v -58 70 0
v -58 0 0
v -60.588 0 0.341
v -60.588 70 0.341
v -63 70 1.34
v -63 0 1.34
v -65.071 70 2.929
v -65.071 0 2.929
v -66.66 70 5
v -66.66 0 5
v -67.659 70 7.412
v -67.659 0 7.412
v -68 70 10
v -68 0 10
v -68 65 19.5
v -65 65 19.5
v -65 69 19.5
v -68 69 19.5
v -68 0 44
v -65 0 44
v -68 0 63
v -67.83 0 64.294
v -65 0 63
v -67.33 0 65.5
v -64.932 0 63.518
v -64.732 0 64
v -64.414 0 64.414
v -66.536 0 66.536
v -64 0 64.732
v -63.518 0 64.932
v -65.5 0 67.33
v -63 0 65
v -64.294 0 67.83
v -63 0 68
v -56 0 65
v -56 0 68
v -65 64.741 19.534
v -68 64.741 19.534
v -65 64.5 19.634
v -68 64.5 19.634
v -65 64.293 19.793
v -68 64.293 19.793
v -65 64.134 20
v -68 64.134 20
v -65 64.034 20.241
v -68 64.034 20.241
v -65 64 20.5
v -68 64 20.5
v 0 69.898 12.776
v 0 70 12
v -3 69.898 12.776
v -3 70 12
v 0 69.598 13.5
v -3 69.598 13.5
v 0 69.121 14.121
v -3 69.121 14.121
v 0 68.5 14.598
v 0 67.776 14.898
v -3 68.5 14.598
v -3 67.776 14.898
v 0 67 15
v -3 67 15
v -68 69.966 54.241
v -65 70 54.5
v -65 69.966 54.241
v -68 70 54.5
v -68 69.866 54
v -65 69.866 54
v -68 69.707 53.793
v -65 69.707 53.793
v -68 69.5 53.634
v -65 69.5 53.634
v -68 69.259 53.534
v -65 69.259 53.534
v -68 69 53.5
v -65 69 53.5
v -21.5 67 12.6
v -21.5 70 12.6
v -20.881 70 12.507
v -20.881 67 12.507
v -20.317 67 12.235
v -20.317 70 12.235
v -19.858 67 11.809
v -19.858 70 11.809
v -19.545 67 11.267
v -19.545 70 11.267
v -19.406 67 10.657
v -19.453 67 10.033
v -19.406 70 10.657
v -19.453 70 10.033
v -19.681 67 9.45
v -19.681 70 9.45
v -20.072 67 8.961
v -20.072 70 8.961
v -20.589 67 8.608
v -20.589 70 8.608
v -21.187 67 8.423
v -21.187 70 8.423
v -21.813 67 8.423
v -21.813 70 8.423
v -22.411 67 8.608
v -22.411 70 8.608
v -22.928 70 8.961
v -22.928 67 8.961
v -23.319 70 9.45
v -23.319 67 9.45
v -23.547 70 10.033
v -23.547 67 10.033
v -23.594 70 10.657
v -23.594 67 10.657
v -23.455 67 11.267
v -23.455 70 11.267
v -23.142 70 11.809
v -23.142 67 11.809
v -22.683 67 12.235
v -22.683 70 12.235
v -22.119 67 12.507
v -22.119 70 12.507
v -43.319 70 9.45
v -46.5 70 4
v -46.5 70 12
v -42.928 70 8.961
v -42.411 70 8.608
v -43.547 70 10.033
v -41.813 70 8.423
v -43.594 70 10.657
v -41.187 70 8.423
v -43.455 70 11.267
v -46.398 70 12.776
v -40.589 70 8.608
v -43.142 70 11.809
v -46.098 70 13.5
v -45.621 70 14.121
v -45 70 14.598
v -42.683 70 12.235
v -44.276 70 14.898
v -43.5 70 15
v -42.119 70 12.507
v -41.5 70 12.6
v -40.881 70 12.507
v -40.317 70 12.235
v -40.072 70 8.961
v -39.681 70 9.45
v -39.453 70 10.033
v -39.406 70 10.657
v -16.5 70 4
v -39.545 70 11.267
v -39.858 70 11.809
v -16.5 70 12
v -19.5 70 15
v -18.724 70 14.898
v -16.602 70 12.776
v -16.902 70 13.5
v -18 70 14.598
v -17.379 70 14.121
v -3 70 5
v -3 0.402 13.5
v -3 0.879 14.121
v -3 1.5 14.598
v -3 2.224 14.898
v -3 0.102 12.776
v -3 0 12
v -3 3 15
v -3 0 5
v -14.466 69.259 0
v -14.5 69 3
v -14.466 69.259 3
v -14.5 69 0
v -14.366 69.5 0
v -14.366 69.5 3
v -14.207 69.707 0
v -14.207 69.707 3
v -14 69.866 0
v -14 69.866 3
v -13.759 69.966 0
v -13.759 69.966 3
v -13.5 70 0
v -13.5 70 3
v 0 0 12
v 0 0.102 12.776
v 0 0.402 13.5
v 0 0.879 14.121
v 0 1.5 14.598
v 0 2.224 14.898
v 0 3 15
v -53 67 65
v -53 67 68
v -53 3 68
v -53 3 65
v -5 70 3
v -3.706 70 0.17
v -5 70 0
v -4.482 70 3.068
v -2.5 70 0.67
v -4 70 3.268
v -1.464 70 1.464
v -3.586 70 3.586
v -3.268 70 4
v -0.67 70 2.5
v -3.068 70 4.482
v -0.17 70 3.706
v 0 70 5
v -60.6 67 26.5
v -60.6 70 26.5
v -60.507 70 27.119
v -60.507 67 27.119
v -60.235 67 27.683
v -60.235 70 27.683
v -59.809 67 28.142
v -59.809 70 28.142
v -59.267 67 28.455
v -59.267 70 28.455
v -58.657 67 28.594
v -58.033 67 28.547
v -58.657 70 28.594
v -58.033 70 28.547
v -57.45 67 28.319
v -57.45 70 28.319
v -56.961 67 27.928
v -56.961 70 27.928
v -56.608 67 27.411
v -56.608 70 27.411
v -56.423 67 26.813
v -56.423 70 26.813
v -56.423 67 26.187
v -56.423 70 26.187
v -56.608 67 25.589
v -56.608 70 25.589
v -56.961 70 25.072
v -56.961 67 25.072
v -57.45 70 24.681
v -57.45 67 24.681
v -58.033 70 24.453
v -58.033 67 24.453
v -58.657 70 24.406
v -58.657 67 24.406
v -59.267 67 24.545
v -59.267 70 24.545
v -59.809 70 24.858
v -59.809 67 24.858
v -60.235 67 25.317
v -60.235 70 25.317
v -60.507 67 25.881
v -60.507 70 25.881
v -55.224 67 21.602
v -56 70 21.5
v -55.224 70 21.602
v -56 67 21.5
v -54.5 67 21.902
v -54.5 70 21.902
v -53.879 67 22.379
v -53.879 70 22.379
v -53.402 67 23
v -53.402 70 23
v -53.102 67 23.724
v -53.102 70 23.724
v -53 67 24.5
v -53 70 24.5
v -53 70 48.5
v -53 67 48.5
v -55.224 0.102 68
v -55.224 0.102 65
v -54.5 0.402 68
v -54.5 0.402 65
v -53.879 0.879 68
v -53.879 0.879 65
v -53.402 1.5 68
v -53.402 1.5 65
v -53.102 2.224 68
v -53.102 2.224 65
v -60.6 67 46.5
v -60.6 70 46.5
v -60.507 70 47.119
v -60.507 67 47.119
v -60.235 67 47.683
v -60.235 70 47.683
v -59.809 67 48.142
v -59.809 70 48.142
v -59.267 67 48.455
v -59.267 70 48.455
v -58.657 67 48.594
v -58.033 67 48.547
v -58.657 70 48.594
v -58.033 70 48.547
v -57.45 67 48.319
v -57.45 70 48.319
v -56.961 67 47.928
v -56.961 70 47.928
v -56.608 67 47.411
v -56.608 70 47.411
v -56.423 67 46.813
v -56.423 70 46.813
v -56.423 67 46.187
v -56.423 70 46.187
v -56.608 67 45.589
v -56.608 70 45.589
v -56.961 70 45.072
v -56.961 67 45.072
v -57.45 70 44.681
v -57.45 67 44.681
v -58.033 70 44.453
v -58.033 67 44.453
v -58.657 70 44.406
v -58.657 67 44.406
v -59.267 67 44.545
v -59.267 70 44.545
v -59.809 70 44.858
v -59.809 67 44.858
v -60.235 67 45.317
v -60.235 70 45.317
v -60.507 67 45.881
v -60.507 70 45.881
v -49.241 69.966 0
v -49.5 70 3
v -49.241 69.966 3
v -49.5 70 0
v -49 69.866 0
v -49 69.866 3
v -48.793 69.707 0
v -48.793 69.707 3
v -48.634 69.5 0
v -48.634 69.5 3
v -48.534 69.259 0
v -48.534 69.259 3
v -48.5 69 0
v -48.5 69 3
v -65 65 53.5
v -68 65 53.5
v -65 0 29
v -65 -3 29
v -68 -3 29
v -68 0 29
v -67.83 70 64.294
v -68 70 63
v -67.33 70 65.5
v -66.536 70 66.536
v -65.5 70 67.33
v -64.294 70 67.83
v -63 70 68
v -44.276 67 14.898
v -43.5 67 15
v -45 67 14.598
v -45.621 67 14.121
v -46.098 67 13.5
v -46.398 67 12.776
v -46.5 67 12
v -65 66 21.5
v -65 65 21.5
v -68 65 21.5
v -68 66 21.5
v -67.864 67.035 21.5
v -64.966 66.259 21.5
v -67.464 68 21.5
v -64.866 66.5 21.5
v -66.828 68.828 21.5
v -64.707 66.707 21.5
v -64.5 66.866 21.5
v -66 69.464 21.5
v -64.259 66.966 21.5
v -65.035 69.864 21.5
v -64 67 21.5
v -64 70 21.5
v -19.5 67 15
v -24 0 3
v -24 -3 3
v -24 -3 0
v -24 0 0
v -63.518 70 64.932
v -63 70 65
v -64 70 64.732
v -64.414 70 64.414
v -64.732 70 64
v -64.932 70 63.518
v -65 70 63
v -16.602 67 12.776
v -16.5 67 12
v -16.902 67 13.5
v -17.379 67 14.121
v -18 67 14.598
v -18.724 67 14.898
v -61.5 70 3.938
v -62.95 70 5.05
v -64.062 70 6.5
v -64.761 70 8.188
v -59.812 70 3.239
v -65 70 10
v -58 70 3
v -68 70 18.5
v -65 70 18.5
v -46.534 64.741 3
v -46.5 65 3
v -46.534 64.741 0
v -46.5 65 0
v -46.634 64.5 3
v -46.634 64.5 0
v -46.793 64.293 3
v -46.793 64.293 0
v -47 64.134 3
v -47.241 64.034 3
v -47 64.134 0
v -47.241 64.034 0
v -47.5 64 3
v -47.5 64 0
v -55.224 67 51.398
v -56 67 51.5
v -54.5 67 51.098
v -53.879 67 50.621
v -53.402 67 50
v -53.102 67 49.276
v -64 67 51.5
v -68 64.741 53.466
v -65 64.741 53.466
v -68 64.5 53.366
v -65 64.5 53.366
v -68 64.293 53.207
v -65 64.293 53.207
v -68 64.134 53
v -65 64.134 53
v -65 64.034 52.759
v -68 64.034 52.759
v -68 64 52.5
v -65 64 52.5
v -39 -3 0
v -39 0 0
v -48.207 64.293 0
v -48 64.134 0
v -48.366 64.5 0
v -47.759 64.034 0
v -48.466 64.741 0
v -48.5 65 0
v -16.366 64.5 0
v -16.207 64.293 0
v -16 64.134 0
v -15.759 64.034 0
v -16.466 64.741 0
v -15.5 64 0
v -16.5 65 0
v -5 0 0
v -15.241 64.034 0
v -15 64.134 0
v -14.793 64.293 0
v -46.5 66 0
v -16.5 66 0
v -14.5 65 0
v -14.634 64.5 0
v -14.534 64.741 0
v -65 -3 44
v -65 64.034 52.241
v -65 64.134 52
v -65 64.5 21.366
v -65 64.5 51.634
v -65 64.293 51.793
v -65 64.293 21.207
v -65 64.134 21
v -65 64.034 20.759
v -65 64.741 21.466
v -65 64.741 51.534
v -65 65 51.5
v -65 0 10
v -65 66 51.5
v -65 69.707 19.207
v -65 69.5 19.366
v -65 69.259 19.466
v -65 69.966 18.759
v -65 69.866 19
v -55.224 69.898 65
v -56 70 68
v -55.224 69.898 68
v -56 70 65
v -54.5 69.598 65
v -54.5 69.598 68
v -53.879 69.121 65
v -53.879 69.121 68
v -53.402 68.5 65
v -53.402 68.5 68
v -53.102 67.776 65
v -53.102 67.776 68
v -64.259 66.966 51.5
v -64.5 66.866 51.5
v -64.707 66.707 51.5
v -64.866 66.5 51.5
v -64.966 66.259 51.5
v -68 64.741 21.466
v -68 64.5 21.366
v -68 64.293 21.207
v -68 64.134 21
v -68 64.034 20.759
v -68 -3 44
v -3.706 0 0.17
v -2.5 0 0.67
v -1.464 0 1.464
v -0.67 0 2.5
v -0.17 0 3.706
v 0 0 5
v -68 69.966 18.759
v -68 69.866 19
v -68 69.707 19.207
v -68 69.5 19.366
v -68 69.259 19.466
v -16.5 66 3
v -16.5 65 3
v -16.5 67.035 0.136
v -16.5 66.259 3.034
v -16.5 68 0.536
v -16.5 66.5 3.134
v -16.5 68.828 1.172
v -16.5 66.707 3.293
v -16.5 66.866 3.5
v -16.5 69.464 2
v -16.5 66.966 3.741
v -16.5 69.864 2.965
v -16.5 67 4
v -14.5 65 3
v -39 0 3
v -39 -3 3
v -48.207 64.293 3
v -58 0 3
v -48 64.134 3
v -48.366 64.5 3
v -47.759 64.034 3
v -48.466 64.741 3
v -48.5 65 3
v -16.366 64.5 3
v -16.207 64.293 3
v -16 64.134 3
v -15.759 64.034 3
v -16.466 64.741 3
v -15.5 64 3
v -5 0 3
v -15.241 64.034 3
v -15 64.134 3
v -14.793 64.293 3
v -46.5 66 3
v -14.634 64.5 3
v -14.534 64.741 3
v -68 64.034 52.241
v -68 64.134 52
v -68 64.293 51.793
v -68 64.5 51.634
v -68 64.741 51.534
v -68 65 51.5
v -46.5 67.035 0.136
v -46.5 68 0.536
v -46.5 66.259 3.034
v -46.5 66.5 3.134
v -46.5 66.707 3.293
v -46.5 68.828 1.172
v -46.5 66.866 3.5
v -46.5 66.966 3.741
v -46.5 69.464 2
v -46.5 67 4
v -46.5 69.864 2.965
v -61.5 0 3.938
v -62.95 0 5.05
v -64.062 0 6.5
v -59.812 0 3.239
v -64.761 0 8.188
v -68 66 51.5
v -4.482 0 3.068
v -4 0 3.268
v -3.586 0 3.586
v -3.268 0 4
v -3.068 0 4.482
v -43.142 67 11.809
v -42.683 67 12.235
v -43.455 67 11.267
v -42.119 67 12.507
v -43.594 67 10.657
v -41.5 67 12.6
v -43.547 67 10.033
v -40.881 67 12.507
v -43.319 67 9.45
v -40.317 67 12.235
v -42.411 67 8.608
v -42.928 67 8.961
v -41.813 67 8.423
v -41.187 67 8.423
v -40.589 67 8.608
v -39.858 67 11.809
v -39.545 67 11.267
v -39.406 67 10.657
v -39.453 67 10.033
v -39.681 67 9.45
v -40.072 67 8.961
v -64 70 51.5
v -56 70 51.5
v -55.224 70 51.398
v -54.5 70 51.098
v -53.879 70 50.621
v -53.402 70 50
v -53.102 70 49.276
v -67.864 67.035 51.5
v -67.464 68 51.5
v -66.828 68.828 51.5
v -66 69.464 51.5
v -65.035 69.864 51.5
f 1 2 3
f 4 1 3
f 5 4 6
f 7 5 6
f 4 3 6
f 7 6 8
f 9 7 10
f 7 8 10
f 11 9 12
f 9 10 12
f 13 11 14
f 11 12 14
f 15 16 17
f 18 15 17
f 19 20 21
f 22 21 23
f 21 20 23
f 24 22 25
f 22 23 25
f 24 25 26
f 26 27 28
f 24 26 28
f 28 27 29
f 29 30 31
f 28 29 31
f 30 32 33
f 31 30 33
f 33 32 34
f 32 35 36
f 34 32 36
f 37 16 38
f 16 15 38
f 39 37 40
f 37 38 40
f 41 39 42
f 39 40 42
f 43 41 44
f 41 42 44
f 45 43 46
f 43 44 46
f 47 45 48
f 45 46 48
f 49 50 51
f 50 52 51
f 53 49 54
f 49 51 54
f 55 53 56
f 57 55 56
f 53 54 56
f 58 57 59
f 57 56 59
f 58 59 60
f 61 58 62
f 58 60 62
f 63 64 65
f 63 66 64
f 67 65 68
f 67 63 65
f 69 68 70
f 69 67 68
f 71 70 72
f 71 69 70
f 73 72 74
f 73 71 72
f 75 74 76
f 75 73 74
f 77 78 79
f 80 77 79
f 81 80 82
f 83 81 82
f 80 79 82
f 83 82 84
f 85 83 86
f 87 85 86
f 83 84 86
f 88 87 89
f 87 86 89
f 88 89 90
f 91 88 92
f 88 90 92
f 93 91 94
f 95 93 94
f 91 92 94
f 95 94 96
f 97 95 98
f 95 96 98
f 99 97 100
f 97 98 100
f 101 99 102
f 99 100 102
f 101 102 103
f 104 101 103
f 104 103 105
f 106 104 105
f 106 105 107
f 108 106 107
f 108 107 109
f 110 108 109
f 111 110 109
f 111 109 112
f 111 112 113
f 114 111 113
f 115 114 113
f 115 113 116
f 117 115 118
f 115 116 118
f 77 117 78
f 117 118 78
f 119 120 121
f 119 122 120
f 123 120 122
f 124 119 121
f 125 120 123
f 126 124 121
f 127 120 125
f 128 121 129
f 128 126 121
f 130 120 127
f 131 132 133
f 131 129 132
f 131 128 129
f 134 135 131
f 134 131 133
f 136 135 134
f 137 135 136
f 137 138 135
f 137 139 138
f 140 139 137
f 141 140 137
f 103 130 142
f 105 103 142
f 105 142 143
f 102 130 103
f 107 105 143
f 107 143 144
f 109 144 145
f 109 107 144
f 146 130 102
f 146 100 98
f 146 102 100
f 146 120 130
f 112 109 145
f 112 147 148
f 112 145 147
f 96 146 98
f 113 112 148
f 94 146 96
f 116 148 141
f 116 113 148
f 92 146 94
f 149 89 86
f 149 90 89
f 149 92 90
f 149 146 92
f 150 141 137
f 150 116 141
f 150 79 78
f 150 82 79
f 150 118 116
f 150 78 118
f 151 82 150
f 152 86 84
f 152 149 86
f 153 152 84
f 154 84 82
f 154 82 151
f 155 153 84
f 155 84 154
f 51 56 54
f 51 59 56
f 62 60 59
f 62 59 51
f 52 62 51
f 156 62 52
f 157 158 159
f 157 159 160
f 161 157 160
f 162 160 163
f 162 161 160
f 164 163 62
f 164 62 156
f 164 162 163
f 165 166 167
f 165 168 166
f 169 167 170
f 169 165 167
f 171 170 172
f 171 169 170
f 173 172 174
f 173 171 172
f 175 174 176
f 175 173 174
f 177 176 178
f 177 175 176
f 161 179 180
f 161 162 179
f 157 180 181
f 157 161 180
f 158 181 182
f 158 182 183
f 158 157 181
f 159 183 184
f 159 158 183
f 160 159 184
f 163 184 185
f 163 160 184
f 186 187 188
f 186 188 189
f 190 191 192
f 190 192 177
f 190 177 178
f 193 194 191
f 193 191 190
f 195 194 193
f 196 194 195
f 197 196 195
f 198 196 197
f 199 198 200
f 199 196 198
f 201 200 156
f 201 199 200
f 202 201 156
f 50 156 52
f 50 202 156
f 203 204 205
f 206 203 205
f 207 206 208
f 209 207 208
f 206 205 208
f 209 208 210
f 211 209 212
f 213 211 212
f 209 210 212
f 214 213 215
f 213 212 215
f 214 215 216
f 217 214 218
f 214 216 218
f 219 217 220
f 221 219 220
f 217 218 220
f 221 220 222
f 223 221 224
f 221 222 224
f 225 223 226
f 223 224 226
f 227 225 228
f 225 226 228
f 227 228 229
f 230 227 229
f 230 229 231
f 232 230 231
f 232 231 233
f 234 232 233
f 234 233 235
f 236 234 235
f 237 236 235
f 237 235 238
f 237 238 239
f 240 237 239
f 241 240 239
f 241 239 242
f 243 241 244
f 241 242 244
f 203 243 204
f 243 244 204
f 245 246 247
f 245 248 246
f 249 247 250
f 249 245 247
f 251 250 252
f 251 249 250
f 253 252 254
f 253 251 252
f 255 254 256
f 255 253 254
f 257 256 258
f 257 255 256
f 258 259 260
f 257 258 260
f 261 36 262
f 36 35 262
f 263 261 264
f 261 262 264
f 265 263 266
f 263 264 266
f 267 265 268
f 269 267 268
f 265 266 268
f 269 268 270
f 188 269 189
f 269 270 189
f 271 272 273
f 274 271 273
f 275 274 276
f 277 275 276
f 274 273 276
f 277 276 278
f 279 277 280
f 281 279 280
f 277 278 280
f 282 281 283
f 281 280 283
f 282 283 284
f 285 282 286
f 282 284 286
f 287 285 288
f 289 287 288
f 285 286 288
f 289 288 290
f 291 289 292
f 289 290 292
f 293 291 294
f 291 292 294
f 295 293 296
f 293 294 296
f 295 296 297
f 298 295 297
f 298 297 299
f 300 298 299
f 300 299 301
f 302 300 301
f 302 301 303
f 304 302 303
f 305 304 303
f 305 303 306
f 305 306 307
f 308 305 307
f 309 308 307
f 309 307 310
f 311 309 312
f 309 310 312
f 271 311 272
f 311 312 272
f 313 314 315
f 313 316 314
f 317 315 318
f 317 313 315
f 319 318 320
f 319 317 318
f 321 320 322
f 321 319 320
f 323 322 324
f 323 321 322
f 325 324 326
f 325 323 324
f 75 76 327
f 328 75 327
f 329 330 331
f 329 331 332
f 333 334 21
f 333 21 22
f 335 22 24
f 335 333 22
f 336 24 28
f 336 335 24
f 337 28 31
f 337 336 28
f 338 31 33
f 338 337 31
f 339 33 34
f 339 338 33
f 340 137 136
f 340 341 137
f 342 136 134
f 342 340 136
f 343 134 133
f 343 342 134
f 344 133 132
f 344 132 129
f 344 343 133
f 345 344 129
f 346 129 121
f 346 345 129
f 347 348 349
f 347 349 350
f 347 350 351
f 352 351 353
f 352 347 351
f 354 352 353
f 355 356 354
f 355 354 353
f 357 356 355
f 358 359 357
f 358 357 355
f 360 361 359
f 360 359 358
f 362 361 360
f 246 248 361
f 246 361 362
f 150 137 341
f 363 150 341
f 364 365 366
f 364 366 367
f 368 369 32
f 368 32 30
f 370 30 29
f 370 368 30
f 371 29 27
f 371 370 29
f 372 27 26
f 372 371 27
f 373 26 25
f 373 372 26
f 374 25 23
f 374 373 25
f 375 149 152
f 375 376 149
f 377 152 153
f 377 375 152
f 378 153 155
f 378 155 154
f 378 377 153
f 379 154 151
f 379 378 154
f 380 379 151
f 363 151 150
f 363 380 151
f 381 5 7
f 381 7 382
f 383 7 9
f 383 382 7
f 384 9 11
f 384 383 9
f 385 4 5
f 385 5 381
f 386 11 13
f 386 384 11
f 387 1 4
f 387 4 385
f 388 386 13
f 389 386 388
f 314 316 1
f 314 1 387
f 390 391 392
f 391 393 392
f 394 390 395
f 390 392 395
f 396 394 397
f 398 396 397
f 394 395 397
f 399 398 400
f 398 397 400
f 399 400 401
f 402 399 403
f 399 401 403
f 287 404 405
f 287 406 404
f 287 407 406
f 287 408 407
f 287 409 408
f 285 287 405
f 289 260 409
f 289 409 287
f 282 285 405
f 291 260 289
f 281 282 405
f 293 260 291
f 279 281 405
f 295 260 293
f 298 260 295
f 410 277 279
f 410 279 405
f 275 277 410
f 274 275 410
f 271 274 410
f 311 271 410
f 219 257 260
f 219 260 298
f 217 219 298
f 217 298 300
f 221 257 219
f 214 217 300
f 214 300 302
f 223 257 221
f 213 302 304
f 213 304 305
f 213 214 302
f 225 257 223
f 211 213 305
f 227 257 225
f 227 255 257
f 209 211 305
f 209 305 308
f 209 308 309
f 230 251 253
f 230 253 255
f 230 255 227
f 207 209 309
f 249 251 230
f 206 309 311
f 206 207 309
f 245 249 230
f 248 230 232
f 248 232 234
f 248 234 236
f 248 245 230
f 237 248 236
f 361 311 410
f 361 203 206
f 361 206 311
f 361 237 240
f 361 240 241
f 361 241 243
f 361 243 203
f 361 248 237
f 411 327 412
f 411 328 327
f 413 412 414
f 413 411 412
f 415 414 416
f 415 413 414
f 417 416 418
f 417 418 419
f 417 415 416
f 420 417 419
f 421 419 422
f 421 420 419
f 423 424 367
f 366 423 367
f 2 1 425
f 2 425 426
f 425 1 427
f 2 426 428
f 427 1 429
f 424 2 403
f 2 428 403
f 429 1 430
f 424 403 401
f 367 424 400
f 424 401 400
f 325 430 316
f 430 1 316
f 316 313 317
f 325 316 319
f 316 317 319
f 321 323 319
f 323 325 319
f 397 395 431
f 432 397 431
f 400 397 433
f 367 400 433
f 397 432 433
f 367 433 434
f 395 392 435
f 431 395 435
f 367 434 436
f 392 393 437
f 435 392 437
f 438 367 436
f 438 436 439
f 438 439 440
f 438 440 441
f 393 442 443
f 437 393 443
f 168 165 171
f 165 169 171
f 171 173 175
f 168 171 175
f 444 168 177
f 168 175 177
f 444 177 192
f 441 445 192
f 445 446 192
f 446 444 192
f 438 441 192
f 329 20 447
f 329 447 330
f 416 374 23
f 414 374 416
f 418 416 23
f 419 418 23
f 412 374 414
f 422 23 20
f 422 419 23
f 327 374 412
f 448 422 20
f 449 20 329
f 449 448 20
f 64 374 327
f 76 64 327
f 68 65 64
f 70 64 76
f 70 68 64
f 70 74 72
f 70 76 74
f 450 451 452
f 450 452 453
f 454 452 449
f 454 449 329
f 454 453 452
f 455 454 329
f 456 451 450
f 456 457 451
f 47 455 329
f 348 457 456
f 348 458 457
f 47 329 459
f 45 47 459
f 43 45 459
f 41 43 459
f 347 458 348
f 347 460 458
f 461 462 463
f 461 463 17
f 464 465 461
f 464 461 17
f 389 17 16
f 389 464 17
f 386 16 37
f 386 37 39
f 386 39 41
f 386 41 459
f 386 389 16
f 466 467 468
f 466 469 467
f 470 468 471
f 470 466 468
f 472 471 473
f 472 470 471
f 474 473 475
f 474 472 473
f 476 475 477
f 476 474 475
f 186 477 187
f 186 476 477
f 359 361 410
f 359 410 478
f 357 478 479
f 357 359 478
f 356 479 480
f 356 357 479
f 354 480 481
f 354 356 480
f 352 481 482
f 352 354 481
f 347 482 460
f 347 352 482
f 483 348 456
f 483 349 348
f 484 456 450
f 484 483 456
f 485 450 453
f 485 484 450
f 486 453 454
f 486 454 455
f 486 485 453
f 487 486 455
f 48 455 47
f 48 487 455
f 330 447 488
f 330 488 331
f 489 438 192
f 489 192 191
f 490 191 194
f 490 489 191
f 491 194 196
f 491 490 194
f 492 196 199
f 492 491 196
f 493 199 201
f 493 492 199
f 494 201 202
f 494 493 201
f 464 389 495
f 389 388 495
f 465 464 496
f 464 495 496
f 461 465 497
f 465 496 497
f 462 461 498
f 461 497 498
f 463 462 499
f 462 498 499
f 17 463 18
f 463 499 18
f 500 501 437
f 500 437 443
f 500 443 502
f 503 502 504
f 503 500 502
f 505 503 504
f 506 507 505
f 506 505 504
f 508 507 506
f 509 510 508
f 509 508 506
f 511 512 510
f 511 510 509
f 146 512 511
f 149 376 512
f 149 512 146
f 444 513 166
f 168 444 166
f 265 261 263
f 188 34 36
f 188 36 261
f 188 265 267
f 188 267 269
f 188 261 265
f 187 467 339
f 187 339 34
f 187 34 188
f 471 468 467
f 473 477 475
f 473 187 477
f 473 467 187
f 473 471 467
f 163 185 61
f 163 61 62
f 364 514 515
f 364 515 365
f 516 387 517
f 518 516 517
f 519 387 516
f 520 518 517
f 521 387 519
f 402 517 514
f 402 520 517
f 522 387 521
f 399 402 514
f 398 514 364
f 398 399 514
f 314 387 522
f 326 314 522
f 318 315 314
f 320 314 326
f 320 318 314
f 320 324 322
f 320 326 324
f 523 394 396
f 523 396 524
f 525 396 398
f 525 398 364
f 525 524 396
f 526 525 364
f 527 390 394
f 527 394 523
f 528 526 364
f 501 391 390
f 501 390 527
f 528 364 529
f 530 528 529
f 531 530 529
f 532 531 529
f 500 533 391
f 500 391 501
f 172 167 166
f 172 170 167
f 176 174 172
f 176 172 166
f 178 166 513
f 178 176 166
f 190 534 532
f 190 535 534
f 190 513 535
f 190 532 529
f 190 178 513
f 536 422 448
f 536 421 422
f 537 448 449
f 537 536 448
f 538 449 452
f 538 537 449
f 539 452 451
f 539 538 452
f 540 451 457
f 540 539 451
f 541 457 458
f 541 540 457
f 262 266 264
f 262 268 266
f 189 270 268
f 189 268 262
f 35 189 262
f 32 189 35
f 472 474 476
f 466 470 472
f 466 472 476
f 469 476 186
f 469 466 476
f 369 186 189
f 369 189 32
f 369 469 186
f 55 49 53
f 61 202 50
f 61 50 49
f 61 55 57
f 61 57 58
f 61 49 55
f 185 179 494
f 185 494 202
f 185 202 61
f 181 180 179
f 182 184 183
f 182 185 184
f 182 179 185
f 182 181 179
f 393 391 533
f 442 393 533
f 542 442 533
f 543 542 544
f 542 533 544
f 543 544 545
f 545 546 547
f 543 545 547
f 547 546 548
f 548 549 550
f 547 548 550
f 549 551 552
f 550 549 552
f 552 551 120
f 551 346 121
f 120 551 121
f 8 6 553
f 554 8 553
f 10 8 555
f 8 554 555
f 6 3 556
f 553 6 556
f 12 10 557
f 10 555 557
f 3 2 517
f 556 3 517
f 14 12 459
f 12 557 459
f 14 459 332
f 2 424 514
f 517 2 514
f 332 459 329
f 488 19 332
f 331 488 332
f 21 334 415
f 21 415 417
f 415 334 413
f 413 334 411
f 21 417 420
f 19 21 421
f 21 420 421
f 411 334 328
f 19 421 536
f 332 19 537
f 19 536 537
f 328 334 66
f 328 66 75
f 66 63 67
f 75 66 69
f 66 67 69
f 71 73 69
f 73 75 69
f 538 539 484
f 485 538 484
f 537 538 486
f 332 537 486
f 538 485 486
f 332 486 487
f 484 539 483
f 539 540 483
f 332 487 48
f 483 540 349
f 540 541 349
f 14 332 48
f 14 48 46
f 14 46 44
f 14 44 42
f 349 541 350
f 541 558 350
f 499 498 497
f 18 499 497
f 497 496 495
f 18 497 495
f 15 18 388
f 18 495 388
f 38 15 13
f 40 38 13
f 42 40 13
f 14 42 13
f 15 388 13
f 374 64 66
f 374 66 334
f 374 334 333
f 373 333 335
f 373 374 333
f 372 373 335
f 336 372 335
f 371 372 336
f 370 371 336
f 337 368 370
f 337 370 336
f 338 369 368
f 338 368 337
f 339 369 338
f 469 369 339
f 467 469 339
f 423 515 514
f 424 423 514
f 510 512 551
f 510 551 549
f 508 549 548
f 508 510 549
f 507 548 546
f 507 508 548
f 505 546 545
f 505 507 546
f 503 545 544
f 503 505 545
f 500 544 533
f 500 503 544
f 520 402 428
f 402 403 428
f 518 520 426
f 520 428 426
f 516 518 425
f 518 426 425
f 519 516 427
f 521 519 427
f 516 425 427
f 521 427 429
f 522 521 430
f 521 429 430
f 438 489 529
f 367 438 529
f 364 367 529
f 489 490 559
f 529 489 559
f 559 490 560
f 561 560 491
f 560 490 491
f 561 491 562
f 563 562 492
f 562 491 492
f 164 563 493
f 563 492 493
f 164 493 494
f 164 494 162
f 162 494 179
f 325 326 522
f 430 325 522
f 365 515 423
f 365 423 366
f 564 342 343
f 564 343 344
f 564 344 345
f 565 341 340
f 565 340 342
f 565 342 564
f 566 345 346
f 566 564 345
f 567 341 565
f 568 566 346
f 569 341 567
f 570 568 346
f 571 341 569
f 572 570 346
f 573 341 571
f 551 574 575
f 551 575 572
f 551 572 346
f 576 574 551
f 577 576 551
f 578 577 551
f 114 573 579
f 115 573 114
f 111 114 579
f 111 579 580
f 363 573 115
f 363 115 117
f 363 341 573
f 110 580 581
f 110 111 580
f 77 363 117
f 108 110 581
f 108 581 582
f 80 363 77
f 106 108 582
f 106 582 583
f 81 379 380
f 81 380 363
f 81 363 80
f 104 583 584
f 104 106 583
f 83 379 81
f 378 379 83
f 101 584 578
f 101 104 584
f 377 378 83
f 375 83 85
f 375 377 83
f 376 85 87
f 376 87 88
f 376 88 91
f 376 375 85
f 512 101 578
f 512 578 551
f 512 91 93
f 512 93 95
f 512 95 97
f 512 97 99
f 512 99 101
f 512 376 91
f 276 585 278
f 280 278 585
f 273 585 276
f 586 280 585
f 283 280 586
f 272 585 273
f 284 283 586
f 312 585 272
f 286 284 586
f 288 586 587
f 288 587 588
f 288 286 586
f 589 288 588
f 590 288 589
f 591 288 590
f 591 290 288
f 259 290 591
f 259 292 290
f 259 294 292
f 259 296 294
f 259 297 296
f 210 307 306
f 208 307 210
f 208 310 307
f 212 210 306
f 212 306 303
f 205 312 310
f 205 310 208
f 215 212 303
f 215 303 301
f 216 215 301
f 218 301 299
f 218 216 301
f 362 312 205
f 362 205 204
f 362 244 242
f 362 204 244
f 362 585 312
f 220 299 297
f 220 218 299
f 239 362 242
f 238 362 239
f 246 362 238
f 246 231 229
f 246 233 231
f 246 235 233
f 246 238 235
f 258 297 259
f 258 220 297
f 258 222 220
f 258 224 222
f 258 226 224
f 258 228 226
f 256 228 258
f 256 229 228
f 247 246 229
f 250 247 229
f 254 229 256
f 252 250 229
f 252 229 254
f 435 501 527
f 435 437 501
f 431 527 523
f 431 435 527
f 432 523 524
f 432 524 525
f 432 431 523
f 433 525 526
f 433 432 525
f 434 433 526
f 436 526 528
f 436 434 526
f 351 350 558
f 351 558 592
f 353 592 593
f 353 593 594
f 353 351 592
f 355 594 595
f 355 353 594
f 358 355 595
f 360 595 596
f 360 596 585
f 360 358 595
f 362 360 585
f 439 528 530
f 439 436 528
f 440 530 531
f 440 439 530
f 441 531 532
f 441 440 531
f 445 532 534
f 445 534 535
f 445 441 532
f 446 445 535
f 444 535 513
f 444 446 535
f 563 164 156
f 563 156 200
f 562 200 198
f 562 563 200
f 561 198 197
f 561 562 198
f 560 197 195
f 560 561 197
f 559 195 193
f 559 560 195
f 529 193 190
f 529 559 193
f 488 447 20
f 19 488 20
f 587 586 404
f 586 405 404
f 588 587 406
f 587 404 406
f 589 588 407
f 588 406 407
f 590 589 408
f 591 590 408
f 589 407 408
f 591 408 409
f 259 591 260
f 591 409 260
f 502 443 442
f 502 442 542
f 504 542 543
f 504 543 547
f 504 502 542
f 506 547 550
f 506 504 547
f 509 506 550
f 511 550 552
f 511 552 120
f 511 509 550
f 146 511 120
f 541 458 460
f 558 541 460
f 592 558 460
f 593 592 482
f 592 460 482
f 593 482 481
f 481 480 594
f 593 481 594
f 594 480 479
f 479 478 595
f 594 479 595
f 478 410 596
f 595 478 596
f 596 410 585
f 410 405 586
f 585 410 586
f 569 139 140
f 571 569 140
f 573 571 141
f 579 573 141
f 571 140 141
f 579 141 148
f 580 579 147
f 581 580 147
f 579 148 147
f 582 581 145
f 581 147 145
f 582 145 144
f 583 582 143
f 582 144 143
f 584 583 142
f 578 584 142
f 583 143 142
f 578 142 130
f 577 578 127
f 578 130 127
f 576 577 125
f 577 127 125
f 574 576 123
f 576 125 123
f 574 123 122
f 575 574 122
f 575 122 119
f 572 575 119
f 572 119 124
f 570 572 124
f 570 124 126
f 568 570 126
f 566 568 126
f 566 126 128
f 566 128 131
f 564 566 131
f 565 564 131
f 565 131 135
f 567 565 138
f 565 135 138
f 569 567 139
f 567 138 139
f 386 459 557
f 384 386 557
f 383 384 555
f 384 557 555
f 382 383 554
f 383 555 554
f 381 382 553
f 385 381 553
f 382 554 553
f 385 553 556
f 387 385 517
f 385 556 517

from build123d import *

# Parameters (mm, degrees)
BASE_FLANGE1_DEPTH           = 70
EDGE_FLANGE1_STRIP_W         = 16
EDGE_FLANGE1_STRIP_H         = 3
EDGE_FLANGE1_STRIP_CUT_DEPTH = 70
EDGE_FLANGE1_DEPTH           = 70
EDGE_FLANGE2_STRIP_W         = 16
EDGE_FLANGE2_STRIP_H         = 3
EDGE_FLANGE2_STRIP_CUT_DEPTH = 70
EDGE_FLANGE2_DEPTH           = 70
SKETCH19_W                   = 15
SKETCH19_H                   = 6
BOSS_EXTRUDE1_DEPTH          = 3
SKETCH20_W                   = 15
SKETCH20_H                   = 6
BOSS_EXTRUDE2_DEPTH          = 3
CUT_EXTRUDE6_DEPTH           = 3
EDGE_FLANGE8_STRIP_W         = 14
EDGE_FLANGE8_STRIP_H         = 3
EDGE_FLANGE8_STRIP_CUT_DEPTH = 30
EDGE_FLANGE8_DEPTH           = 30
SKETCH71_R                   = 2.1
CUT_EXTRUDE7_DEPTH           = 3
CUT_EXTRUDE8_DEPTH           = 3
EDGE_FLANGE9_STRIP_W         = 14
EDGE_FLANGE9_STRIP_H         = 3
EDGE_FLANGE9_STRIP_CUT_DEPTH = 30
EDGE_FLANGE9_DEPTH           = 30
SKETCH77_R                   = 2.1
CUT_EXTRUDE9_DEPTH           = 3
FILLET1_R                    = 1
FILLET2_R                    = 3


# Sheet-metal steps are written as plain solids
with BuildPart() as part:
    # Sketch1 → Base-Flange1 (new body)
    with BuildSketch(Plane(origin=(0, 0, 0), x_dir=(1, 0, 0), z_dir=(0, 1, 0))):
        with BuildLine():
            Line((0, 0), (-58, 0))
            ThreePointArc((-58, 0), (-65.071067812, -2.928932188), (-68, -10))
            Line((-68, -10), (-68, -68))
            Line((-68, -68), (-65, -68))
            Line((-65, -68), (-65, -10))
            ThreePointArc((-65, -10), (-62.949747468, -5.050252532), (-58, -3))
            Line((-58, -3), (0, -3))
            Line((0, -3), (0, 0))
        make_face()
    extrude(amount=BASE_FLANGE1_DEPTH)

    # Edge-Flange1 strip (across the edge) → Edge-Flange1 strip cut (cut)
    with BuildSketch(Plane(origin=(0, 0, 3), x_dir=(-1, 0, 0), z_dir=(0, 1, 0))):
        with Locations((-3, -1.5)):
            Rectangle(EDGE_FLANGE1_STRIP_W, EDGE_FLANGE1_STRIP_H)
    extrude(amount=EDGE_FLANGE1_STRIP_CUT_DEPTH, mode=Mode.SUBTRACT)

    # Edge-Flange1 section (across the edge) → Edge-Flange1 (add)
    with BuildSketch(Plane(origin=(0, 0, 3), x_dir=(-1, 0, 0), z_dir=(0, 1, 0))):
        with BuildLine():
            Line((0, 2), (0, 12))
            Line((0, 12), (3, 12))
            Line((3, 12), (3, 2))
            ThreePointArc((3, 2), (3.585786438, 0.585786438), (5, 0))
            Line((5, 0), (5, -3))
            ThreePointArc((5, -3), (1.464466094, -1.535533906), (0, 2))
        make_face()
    extrude(amount=EDGE_FLANGE1_DEPTH)

    # Edge-Flange2 strip (across the edge) → Edge-Flange2 strip cut (cut)
    with BuildSketch(Plane(origin=(-65, 70, 68), x_dir=(0, 0, -1), z_dir=(0, -1, 0))):
        with Locations((-3, -1.5)):
            Rectangle(EDGE_FLANGE2_STRIP_W, EDGE_FLANGE2_STRIP_H)
    extrude(amount=EDGE_FLANGE2_STRIP_CUT_DEPTH, mode=Mode.SUBTRACT)

    # Edge-Flange2 section (across the edge) → Edge-Flange2 (add)
    with BuildSketch(Plane(origin=(-65, 70, 68), x_dir=(0, 0, -1), z_dir=(0, -1, 0))):
        with BuildLine():
            Line((0, 2), (0, 12))
            Line((0, 12), (3, 12))
            Line((3, 12), (3, 2))
            ThreePointArc((3, 2), (3.585786438, 0.585786438), (5, 0))
            Line((5, 0), (5, -3))
            ThreePointArc((5, -3), (1.464466094, -1.535533906), (0, 2))
        make_face()
    extrude(amount=EDGE_FLANGE2_DEPTH)

    # Sketch19 → Boss-Extrude1 (add)
    with BuildSketch(Plane.XY.offset(3)):
        with Locations((-31.5, 0)):
            Rectangle(SKETCH19_W, SKETCH19_H)
    extrude(amount=-BOSS_EXTRUDE1_DEPTH)

    # Sketch20 → Boss-Extrude2 (add)
    with BuildSketch(Plane(origin=(-65, 0, 0), x_dir=(0, 0, -1), z_dir=(1, 0, 0))):
        with Locations((-36.5, 0)):
            Rectangle(SKETCH20_W, SKETCH20_H)
    extrude(amount=-BOSS_EXTRUDE2_DEPTH)

    # Sketch63 → Cut-Extrude6 (cut)
    with BuildSketch(Plane(origin=(-65, 0, 0), x_dir=(0, 0, -1), z_dir=(1, 0, 0))):
        Polygon((-51.5, 64), (-51.5, 67), (-51.5, 70), (-53.5, 70), (-53.5, 64), align=None)
        Polygon((-21.5, 70), (-21.5, 67), (-21.5, 64), (-19.5, 64), (-19.5, 70), align=None)
    extrude(amount=-CUT_EXTRUDE6_DEPTH, mode=Mode.SUBTRACT)

    # Edge-Flange8 strip (across the edge) → Edge-Flange8 strip cut (cut)
    with BuildSketch(Plane(origin=(-65, 70, 21.5), x_dir=(0, -1, 0), z_dir=(0, 0, 1))):
        with Locations((-3, -1.5)):
            Rectangle(EDGE_FLANGE8_STRIP_W, EDGE_FLANGE8_STRIP_H)
    extrude(amount=EDGE_FLANGE8_STRIP_CUT_DEPTH, mode=Mode.SUBTRACT)

    # Edge-Flange8 section (across the edge) → Edge-Flange8 (add)
    with BuildSketch(Plane(origin=(-65, 70, 21.5), x_dir=(0, -1, 0), z_dir=(0, 0, 1))):
        with BuildLine():
            Line((0, 1), (0, 12))
            Line((0, 12), (3, 12))
            Line((3, 12), (3, 1))
            ThreePointArc((3, 1), (3.292893219, 0.292893219), (4, 0))
            Line((4, 0), (4, -3))
            ThreePointArc((4, -3), (1.171572875, -1.828427125), (0, 1))
        make_face()
    extrude(amount=EDGE_FLANGE8_DEPTH)

    # Sketch71 → Cut-Extrude7 (cut)
    with BuildSketch(Plane(origin=(0, 70, 0), x_dir=(1, 0, 0), z_dir=(0, 1, 0))):
        with Locations(Location((-58.5, -26.5, 0), (0, 0, 180))):
            Circle(SKETCH71_R)
        with Locations(Location((-58.5, -46.5, 0), (0, 0, 180))):
            Circle(SKETCH71_R)
    extrude(amount=-CUT_EXTRUDE7_DEPTH, mode=Mode.SUBTRACT)

    # Sketch72 → Cut-Extrude8 (cut)
    with BuildSketch(Plane.XY.offset(3)):
        Polygon((-46.5, 66.882619945), (-46.5, 70), (-48.5, 70), (-48.5, 64), (-46.5, 64), align=None)
        Polygon((-14.5, 70), (-16.5, 70), (-16.5, 66.882619945), (-16.5, 64), (-14.5, 64), align=None)
    extrude(amount=-CUT_EXTRUDE8_DEPTH, mode=Mode.SUBTRACT)

    # Edge-Flange9 strip (across the edge) → Edge-Flange9 strip cut (cut)
    with BuildSketch(Plane(origin=(-16.5, 70, 3), x_dir=(0, -1, 0), z_dir=(-1, 0, 0))):
        with Locations((-3, -1.5)):
            Rectangle(EDGE_FLANGE9_STRIP_W, EDGE_FLANGE9_STRIP_H)
    extrude(amount=EDGE_FLANGE9_STRIP_CUT_DEPTH, mode=Mode.SUBTRACT)

    # Edge-Flange9 section (across the edge) → Edge-Flange9 (add)
    with BuildSketch(Plane(origin=(-16.5, 70, 3), x_dir=(0, -1, 0), z_dir=(-1, 0, 0))):
        with BuildLine():
            Line((0, 1), (0, 12))
            Line((0, 12), (3, 12))
            Line((3, 12), (3, 1))
            ThreePointArc((3, 1), (3.292893219, 0.292893219), (4, 0))
            Line((4, 0), (4, -3))
            ThreePointArc((4, -3), (1.171572875, -1.828427125), (0, 1))
        make_face()
    extrude(amount=EDGE_FLANGE9_DEPTH)

    # Sketch77 → Cut-Extrude9 (cut)
    with BuildSketch(Plane(origin=(0, 70, 0), x_dir=(1, 0, 0), z_dir=(0, 1, 0))):
        with Locations(Location((-41.5, -10.5, 0), (0, 0, 270))):
            Circle(SKETCH77_R)
        with Locations(Location((-21.5, -10.5, 0), (0, 0, 270))):
            Circle(SKETCH77_R)
    extrude(amount=-CUT_EXTRUDE9_DEPTH, mode=Mode.SUBTRACT)

    # Fillet1
    fillet1_edges = [part.edges().sort_by_distance(p)[0] for p in [
        (-66.5, 70, 53.5),
        (-66.5, 64, 53.5),
        (-66.5, 64, 51.5),
        (-66.5, 64, 21.5),
        (-66.5, 64, 19.5),
        (-66.5, 70, 19.5),
        (-14.5, 70, 1.5),
        (-48.5, 70, 1.5),
        (-14.5, 64, 1.5),
        (-16.5, 64, 1.5),
        (-46.5, 64, 1.5),
        (-48.5, 64, 1.5),
    ]]
    fillet(fillet1_edges, radius=FILLET1_R - 0.0001)  # a hair under: the kernel refuses the full size

    # Fillet2
    fillet2_edges = [part.edges().sort_by_distance(p)[0] for p in [
        (-1.5, 70, 15),
        (-1.5, 0, 15),
        (-53, 0, 66.5),
        (-53, 70, 66.5),
        (-53, 68.5, 21.5),
        (-53, 68.5, 51.5),
        (-16.5, 68.5, 15),
        (-46.5, 68.5, 15),
    ]]
    fillet(fillet2_edges, radius=FILLET2_R)


solid = part.part
